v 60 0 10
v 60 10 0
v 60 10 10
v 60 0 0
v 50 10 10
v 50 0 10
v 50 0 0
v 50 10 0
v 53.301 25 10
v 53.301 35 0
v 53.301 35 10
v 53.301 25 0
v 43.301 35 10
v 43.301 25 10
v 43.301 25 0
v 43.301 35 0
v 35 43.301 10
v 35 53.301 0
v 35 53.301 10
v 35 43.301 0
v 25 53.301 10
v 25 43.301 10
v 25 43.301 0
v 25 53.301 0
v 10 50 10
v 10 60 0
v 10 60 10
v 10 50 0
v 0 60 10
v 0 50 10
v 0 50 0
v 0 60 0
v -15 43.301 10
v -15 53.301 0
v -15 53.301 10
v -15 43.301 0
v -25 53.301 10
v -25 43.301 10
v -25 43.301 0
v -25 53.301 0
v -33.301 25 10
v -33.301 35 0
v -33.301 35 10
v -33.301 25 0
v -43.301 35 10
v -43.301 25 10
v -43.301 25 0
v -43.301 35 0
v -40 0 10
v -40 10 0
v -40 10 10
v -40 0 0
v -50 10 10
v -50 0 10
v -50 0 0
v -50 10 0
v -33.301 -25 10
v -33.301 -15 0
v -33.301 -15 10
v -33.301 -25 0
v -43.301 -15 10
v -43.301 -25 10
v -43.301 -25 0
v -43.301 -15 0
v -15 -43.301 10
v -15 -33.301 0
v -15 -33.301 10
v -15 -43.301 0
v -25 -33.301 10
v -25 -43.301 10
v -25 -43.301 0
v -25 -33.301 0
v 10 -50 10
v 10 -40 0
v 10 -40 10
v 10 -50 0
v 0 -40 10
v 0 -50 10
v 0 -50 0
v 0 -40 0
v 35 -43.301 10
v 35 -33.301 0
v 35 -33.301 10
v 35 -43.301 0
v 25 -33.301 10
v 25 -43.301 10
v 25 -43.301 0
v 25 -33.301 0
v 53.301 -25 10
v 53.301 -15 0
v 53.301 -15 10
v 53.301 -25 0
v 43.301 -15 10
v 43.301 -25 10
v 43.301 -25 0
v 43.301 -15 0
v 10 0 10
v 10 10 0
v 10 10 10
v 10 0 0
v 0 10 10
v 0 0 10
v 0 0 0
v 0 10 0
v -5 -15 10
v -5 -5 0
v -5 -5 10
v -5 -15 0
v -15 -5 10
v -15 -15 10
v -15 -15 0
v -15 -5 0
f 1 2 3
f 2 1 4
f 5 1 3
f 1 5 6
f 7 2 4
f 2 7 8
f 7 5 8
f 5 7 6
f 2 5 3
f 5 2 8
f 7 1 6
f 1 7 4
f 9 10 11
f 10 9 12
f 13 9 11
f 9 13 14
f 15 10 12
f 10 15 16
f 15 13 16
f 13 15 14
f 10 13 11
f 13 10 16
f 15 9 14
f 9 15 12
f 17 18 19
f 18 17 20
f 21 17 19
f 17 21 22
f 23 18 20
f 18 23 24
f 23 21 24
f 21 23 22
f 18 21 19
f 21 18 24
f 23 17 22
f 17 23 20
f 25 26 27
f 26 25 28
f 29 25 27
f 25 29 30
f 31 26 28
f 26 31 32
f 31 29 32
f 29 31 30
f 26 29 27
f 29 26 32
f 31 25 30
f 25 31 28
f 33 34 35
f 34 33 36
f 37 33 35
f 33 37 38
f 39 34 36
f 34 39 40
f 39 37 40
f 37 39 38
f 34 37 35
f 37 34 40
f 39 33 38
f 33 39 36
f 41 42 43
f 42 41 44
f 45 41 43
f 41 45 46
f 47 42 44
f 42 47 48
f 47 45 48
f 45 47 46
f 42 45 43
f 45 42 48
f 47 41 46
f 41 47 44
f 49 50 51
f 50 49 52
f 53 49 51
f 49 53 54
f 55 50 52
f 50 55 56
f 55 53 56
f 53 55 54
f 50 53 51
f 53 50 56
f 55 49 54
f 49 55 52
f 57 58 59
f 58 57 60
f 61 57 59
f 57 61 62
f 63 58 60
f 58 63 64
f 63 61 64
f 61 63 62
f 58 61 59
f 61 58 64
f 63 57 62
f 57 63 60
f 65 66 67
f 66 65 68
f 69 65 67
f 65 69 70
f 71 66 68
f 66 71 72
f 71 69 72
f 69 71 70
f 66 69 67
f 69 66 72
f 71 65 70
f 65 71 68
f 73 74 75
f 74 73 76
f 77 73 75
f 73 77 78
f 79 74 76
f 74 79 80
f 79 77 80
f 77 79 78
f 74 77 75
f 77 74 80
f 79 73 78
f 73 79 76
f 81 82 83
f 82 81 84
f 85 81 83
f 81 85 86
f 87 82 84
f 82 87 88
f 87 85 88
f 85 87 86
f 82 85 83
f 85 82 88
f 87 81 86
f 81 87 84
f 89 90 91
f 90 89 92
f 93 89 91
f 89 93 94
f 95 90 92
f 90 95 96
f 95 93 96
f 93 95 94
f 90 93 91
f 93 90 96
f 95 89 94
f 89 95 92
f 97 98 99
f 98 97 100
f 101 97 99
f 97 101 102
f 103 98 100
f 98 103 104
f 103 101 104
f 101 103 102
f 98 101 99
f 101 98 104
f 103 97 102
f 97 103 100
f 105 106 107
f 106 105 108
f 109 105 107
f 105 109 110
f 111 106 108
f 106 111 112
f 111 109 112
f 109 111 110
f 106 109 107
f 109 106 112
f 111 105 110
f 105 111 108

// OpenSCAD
for(a = [0:30:360]) {
    rotate([0,0,a]) {
        translate([50,0,0]) {
            rotate([0,0,-a]) {
                cube(10,10,10);
            }
        }
    }
}
cube(10,10,10);
translate([-15,-15,0])
    cube(10,10,10);
